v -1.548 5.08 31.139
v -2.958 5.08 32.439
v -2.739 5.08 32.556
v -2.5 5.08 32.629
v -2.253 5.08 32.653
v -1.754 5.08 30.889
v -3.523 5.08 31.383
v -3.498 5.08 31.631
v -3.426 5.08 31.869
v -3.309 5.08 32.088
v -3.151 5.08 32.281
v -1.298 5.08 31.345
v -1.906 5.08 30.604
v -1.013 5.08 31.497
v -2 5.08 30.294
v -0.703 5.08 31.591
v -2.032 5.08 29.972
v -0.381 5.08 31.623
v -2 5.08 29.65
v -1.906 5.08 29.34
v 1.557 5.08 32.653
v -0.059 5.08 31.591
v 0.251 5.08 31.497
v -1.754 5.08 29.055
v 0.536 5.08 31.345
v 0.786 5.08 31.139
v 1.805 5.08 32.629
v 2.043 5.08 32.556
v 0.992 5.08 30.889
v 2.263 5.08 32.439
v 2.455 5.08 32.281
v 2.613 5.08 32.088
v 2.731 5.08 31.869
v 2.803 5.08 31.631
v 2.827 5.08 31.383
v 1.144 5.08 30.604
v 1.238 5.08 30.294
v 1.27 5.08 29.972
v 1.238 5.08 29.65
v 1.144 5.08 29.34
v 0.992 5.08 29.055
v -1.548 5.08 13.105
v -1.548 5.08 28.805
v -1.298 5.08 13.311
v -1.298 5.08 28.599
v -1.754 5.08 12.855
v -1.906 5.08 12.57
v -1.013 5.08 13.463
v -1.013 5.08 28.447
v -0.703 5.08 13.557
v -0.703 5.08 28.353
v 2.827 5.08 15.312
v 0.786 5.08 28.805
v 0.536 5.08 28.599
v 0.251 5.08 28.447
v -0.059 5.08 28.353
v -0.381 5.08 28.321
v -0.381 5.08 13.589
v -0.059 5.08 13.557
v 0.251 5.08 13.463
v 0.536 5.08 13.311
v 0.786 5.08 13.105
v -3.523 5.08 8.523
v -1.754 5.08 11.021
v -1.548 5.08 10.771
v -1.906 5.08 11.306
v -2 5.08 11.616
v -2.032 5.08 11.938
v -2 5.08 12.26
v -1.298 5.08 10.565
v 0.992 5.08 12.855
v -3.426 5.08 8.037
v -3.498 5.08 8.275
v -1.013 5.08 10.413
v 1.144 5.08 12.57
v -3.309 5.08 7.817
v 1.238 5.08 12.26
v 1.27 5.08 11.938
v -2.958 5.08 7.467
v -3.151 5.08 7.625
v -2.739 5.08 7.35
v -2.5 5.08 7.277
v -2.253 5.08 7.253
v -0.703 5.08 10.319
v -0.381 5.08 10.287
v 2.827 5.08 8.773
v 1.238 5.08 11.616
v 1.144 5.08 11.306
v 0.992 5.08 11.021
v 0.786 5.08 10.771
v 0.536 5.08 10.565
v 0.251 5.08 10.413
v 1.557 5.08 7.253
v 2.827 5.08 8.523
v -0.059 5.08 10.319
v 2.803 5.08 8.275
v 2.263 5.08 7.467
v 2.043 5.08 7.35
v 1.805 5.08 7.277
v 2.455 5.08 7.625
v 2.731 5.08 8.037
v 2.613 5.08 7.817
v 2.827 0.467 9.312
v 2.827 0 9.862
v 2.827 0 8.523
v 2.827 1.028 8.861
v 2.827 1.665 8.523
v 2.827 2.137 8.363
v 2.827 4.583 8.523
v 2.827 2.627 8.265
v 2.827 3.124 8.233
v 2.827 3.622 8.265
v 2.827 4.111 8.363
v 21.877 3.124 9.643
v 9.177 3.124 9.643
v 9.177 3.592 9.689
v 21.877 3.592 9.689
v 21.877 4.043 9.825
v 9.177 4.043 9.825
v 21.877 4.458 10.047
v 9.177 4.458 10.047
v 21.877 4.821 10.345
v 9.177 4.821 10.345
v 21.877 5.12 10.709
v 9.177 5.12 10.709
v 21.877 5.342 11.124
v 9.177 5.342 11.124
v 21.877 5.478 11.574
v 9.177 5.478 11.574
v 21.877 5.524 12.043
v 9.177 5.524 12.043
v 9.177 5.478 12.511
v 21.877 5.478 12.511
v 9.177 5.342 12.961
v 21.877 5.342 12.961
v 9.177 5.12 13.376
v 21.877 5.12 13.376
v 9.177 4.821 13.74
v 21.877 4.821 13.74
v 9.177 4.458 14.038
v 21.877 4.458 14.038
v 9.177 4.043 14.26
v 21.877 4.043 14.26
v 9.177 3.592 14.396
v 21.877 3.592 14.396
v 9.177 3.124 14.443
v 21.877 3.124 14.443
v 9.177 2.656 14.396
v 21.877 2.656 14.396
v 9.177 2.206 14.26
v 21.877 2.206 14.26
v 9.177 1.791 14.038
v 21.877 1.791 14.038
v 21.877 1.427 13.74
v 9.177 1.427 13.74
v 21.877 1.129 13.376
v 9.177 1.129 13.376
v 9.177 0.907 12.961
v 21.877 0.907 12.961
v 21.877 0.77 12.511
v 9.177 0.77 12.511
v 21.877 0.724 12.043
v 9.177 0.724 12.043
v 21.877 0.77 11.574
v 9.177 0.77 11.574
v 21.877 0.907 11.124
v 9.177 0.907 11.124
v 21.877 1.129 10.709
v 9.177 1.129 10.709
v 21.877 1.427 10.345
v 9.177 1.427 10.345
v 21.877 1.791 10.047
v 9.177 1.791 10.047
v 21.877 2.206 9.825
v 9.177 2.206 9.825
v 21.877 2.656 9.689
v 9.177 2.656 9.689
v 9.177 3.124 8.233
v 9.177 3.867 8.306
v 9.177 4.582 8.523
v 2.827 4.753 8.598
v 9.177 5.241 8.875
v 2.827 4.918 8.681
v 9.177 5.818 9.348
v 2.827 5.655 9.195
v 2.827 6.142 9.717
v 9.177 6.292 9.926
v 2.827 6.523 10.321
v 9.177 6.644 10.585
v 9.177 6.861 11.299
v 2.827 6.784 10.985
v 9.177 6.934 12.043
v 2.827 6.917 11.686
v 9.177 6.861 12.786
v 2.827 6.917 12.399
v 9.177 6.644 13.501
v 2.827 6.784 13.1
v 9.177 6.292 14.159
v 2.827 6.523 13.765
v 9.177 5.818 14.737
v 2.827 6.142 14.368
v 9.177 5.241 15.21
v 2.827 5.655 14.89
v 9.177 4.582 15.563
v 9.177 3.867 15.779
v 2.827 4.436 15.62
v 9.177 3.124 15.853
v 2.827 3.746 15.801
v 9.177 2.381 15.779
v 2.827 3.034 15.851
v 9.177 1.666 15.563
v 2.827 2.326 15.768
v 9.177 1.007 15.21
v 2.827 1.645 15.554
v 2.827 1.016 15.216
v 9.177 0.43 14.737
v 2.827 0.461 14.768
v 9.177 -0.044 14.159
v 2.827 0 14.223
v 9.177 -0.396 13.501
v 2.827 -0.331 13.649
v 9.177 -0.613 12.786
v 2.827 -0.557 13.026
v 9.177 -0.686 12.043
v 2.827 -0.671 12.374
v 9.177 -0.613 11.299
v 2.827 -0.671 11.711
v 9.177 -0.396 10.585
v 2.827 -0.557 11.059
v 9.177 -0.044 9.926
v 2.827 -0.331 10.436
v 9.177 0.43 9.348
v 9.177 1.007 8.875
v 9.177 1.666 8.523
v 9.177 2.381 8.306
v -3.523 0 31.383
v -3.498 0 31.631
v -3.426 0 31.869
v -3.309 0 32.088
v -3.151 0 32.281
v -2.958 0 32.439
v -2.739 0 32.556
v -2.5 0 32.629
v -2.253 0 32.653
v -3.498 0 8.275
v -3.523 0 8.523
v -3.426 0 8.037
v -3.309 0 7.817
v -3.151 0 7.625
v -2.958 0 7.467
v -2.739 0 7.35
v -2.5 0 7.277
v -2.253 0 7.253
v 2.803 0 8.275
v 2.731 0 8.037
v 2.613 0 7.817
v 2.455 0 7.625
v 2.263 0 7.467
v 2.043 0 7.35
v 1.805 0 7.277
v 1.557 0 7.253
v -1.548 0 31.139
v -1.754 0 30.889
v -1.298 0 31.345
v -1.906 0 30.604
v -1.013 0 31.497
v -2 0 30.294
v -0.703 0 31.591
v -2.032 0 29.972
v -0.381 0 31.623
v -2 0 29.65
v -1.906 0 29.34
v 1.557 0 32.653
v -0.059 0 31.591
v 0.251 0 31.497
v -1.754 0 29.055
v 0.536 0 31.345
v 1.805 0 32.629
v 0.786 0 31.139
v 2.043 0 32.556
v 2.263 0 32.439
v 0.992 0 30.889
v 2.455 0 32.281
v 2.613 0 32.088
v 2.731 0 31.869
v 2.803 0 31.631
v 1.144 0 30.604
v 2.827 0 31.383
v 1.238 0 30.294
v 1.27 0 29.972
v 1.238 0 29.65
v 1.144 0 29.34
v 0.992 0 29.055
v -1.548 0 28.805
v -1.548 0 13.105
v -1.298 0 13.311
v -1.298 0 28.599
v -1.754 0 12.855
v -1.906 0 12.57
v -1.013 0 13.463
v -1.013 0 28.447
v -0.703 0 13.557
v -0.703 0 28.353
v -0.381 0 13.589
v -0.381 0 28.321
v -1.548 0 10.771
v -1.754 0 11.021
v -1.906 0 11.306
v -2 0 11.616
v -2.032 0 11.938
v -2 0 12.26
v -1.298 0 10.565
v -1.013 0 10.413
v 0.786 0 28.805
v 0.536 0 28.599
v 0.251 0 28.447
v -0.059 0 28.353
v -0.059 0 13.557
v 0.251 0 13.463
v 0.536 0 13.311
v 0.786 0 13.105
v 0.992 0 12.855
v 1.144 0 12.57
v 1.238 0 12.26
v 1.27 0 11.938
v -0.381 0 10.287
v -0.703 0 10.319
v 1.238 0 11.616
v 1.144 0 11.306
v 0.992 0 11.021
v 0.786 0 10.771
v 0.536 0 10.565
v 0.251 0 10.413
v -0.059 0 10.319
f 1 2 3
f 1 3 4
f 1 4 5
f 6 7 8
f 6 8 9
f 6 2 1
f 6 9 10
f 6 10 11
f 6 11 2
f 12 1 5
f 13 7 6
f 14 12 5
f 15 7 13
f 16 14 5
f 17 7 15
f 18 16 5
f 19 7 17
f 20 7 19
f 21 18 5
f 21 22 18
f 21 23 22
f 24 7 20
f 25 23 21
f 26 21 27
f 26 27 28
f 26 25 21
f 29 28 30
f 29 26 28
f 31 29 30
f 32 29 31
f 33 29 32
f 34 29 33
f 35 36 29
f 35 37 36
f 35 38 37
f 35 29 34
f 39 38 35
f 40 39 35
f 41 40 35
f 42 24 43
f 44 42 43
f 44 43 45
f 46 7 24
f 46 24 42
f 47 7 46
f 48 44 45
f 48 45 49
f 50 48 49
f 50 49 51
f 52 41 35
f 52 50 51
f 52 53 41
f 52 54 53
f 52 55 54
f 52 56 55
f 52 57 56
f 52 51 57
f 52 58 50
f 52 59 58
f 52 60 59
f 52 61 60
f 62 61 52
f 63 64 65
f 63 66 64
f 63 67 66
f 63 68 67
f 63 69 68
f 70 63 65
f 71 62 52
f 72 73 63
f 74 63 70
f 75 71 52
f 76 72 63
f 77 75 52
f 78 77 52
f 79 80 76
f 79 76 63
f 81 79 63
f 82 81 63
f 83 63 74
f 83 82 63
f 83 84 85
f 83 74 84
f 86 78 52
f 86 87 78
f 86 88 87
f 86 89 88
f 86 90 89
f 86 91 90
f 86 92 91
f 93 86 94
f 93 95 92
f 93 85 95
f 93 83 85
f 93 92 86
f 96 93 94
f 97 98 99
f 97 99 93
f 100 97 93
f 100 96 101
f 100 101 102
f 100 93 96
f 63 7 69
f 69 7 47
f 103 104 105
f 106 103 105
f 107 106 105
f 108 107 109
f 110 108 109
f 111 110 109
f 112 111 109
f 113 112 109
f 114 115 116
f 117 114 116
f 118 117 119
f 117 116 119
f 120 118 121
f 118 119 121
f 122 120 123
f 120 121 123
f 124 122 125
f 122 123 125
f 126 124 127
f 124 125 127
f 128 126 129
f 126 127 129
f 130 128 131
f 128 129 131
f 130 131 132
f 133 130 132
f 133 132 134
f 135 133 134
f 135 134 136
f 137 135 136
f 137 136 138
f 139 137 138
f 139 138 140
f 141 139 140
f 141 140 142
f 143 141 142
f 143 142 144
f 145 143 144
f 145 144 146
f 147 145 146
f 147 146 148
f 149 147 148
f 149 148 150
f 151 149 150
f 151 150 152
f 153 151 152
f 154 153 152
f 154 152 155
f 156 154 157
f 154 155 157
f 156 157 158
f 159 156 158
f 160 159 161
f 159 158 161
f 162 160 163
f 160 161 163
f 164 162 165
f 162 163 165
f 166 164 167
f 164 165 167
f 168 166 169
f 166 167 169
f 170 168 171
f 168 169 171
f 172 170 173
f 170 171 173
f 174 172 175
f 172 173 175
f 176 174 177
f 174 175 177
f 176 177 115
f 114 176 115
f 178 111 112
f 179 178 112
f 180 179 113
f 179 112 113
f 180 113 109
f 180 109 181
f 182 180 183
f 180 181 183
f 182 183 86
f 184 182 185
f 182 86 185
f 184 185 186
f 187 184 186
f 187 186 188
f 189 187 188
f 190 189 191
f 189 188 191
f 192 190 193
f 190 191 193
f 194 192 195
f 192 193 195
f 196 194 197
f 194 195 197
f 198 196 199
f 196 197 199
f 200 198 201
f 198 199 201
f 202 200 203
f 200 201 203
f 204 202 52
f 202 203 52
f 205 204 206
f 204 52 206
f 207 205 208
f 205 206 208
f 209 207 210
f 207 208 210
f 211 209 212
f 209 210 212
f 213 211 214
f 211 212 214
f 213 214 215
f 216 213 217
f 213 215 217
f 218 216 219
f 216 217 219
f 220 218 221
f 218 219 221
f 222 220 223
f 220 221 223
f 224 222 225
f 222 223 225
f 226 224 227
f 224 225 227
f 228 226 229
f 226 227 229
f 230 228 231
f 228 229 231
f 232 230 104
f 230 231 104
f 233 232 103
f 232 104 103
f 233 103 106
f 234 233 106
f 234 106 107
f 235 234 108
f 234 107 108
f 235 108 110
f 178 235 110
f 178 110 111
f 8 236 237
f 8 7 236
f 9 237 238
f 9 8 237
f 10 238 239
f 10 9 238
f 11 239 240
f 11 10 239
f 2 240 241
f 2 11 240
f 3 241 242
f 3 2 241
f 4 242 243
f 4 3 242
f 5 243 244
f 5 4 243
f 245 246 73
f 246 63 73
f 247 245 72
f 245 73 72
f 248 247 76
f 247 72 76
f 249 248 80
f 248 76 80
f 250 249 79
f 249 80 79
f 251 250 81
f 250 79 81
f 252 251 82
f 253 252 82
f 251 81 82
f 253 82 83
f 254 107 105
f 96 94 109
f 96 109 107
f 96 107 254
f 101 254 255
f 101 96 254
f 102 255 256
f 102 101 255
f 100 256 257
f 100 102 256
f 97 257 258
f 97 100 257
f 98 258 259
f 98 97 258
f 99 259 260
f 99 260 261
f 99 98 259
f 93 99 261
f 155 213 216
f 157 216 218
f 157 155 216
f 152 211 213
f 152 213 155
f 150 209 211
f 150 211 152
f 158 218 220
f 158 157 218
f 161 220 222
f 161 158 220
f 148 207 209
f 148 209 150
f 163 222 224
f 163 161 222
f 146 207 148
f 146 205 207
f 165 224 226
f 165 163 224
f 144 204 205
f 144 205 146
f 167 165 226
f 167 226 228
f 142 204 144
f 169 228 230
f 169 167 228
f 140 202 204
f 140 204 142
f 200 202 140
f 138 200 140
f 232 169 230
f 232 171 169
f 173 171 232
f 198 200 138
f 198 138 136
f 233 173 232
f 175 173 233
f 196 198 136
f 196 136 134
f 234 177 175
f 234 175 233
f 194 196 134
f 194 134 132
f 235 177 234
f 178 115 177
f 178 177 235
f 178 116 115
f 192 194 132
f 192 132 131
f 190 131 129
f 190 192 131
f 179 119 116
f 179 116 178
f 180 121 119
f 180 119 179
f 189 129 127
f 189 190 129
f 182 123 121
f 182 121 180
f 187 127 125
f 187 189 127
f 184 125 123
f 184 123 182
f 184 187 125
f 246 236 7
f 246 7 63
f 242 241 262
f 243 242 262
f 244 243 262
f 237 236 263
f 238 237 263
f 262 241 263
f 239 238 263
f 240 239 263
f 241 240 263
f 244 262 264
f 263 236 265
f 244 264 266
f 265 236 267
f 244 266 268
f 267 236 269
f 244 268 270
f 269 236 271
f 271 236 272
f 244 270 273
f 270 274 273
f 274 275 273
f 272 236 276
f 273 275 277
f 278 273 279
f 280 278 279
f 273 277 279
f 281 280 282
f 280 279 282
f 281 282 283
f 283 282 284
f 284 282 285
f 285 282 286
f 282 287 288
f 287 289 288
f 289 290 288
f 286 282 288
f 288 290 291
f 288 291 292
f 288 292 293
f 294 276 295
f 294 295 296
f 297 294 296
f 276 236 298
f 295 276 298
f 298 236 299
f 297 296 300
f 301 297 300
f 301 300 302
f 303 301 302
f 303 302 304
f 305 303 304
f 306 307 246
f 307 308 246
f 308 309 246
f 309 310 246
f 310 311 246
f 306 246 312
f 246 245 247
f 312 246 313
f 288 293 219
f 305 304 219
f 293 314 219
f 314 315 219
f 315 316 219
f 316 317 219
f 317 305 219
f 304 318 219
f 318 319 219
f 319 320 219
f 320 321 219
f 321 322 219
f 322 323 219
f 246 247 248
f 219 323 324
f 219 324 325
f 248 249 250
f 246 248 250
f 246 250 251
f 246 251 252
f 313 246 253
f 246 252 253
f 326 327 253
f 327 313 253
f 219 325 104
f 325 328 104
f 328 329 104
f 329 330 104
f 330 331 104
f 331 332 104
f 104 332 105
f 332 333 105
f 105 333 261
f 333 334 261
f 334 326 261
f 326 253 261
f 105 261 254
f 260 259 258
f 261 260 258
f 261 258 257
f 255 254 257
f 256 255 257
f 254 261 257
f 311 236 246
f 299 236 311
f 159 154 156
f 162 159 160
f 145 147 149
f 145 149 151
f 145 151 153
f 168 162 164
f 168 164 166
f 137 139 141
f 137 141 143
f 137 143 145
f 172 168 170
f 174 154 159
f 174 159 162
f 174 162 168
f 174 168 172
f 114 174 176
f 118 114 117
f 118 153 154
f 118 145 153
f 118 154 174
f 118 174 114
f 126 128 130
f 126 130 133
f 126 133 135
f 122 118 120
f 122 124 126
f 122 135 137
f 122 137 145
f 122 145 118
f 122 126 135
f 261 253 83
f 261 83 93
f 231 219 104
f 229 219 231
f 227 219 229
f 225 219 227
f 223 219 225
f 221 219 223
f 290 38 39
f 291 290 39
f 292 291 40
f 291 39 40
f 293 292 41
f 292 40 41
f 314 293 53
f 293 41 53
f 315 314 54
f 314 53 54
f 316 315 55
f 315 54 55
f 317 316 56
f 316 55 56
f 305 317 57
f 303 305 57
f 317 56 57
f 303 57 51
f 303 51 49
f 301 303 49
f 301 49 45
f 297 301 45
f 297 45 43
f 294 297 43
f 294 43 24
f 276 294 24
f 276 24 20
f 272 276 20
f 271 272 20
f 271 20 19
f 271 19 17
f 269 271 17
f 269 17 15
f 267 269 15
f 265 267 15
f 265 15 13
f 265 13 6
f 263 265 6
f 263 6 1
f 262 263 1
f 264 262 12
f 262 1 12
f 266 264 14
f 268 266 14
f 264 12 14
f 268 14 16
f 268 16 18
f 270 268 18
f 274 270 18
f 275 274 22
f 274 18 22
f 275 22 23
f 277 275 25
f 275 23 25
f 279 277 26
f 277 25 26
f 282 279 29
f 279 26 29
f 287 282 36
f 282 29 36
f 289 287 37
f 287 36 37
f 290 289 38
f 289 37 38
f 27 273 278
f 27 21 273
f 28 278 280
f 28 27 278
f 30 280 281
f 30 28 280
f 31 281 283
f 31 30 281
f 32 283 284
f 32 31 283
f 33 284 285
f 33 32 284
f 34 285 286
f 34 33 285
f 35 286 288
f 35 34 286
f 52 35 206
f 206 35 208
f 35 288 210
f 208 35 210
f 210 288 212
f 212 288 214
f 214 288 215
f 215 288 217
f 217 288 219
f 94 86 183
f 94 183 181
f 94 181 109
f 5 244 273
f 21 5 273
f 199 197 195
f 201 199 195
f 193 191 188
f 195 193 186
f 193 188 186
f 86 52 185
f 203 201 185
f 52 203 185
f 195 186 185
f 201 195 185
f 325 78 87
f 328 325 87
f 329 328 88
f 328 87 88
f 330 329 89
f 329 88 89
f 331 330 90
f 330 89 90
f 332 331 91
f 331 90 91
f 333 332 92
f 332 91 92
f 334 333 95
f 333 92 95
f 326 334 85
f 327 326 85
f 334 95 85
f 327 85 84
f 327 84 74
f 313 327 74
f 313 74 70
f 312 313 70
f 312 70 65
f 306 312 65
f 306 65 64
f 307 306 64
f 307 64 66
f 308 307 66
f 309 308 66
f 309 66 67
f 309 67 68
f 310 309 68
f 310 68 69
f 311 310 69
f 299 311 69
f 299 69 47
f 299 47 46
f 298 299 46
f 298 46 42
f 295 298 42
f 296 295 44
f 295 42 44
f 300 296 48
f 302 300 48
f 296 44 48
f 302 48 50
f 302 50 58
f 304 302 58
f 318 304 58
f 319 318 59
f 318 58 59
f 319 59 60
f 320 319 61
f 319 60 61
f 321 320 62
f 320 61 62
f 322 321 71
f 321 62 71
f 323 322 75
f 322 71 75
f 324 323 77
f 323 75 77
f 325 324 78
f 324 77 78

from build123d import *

# Parameters (mm, degrees)
SKETCH1_W           = 6.35
SKETCH1_H           = 25.4
EXTRUDE_THIN1_DEPTH = 5.08
FILLET4_R           = 1.27
FILLET5_R           = 1.27
FILLET6_R           = 1.27
SKETCH5_R           = 1.651
CUT_EXTRUDE1_DEPTH  = 6.35
SKETCH8_R           = 3.81
BOSS_EXTRUDE1_DEPTH = 6.35
SKETCH12_R          = 2.3999952
BOSS_EXTRUDE2_DEPTH = 19.05
LPATTERN1_COUNT     = 2
LPATTERN1_PITCH     = 18.034


with BuildPart() as part:
    # Sketch1 → Extrude-Thin1 (new body)
    with BuildSketch(Plane(origin=(0, 0, 0), x_dir=(1, 0, 0), z_dir=(0, 1, 0))):
        with Locations((-0.347720453, -19.952908818)):
            Rectangle(SKETCH1_W, SKETCH1_H)
    extrude(amount=EXTRUDE_THIN1_DEPTH)

    # Fillet4
    fillet4_edges = [part.edges().sort_by_distance(p)[0] for p in [
        (-3.522720453, 2.54, 32.652908818),
    ]]
    fillet(fillet4_edges, radius=FILLET4_R)

    # Fillet5
    fillet5_edges = [part.edges().sort_by_distance(p)[0] for p in [
        (2.827279547, 2.54, 32.652908818),
    ]]
    fillet(fillet5_edges, radius=FILLET5_R)

    # Fillet6
    fillet6_edges = [part.edges().sort_by_distance(p)[0] for p in [
        (-3.522720453, 2.54, 7.252908818),
        (2.827279547, 2.54, 7.252908818),
    ]]
    fillet(fillet6_edges, radius=FILLET6_R)

    # Sketch5 → Cut-Extrude1 (cut)
    with BuildSketch(Plane(origin=(0, 5.08, 0), x_dir=(1, 0, 0), z_dir=(0, 1, 0))):
        with Locations((-0.381, -29.972)):
            Circle(SKETCH5_R)
    cut_extrude1 = extrude(amount=-CUT_EXTRUDE1_DEPTH, mode=Mode.SUBTRACT)

    # Sketch8 → Boss-Extrude1 (add)
    with BuildSketch(Plane(origin=(2.827279547, 0, 0), x_dir=(0, 0, -1), z_dir=(1, 0, 0))):
        with Locations((-12.042526448, 3.1242)):
            Circle(SKETCH8_R)
    extrude(amount=BOSS_EXTRUDE1_DEPTH)

    # Sketch12 → Boss-Extrude2 (add)
    with BuildSketch(Plane(origin=(2.827279547, 0, 0), x_dir=(0, 0, -1), z_dir=(1, 0, 0))):
        with Locations((-12.042526448, 3.1242)):
            Circle(SKETCH12_R)
    extrude(amount=BOSS_EXTRUDE2_DEPTH)

    # LPattern1: Cut-Extrude1 ×2
    with Locations(*[(0, 0, -i * LPATTERN1_PITCH) for i in range(1, LPATTERN1_COUNT)]):
        add(cut_extrude1, mode=Mode.SUBTRACT)


solid = part.part
